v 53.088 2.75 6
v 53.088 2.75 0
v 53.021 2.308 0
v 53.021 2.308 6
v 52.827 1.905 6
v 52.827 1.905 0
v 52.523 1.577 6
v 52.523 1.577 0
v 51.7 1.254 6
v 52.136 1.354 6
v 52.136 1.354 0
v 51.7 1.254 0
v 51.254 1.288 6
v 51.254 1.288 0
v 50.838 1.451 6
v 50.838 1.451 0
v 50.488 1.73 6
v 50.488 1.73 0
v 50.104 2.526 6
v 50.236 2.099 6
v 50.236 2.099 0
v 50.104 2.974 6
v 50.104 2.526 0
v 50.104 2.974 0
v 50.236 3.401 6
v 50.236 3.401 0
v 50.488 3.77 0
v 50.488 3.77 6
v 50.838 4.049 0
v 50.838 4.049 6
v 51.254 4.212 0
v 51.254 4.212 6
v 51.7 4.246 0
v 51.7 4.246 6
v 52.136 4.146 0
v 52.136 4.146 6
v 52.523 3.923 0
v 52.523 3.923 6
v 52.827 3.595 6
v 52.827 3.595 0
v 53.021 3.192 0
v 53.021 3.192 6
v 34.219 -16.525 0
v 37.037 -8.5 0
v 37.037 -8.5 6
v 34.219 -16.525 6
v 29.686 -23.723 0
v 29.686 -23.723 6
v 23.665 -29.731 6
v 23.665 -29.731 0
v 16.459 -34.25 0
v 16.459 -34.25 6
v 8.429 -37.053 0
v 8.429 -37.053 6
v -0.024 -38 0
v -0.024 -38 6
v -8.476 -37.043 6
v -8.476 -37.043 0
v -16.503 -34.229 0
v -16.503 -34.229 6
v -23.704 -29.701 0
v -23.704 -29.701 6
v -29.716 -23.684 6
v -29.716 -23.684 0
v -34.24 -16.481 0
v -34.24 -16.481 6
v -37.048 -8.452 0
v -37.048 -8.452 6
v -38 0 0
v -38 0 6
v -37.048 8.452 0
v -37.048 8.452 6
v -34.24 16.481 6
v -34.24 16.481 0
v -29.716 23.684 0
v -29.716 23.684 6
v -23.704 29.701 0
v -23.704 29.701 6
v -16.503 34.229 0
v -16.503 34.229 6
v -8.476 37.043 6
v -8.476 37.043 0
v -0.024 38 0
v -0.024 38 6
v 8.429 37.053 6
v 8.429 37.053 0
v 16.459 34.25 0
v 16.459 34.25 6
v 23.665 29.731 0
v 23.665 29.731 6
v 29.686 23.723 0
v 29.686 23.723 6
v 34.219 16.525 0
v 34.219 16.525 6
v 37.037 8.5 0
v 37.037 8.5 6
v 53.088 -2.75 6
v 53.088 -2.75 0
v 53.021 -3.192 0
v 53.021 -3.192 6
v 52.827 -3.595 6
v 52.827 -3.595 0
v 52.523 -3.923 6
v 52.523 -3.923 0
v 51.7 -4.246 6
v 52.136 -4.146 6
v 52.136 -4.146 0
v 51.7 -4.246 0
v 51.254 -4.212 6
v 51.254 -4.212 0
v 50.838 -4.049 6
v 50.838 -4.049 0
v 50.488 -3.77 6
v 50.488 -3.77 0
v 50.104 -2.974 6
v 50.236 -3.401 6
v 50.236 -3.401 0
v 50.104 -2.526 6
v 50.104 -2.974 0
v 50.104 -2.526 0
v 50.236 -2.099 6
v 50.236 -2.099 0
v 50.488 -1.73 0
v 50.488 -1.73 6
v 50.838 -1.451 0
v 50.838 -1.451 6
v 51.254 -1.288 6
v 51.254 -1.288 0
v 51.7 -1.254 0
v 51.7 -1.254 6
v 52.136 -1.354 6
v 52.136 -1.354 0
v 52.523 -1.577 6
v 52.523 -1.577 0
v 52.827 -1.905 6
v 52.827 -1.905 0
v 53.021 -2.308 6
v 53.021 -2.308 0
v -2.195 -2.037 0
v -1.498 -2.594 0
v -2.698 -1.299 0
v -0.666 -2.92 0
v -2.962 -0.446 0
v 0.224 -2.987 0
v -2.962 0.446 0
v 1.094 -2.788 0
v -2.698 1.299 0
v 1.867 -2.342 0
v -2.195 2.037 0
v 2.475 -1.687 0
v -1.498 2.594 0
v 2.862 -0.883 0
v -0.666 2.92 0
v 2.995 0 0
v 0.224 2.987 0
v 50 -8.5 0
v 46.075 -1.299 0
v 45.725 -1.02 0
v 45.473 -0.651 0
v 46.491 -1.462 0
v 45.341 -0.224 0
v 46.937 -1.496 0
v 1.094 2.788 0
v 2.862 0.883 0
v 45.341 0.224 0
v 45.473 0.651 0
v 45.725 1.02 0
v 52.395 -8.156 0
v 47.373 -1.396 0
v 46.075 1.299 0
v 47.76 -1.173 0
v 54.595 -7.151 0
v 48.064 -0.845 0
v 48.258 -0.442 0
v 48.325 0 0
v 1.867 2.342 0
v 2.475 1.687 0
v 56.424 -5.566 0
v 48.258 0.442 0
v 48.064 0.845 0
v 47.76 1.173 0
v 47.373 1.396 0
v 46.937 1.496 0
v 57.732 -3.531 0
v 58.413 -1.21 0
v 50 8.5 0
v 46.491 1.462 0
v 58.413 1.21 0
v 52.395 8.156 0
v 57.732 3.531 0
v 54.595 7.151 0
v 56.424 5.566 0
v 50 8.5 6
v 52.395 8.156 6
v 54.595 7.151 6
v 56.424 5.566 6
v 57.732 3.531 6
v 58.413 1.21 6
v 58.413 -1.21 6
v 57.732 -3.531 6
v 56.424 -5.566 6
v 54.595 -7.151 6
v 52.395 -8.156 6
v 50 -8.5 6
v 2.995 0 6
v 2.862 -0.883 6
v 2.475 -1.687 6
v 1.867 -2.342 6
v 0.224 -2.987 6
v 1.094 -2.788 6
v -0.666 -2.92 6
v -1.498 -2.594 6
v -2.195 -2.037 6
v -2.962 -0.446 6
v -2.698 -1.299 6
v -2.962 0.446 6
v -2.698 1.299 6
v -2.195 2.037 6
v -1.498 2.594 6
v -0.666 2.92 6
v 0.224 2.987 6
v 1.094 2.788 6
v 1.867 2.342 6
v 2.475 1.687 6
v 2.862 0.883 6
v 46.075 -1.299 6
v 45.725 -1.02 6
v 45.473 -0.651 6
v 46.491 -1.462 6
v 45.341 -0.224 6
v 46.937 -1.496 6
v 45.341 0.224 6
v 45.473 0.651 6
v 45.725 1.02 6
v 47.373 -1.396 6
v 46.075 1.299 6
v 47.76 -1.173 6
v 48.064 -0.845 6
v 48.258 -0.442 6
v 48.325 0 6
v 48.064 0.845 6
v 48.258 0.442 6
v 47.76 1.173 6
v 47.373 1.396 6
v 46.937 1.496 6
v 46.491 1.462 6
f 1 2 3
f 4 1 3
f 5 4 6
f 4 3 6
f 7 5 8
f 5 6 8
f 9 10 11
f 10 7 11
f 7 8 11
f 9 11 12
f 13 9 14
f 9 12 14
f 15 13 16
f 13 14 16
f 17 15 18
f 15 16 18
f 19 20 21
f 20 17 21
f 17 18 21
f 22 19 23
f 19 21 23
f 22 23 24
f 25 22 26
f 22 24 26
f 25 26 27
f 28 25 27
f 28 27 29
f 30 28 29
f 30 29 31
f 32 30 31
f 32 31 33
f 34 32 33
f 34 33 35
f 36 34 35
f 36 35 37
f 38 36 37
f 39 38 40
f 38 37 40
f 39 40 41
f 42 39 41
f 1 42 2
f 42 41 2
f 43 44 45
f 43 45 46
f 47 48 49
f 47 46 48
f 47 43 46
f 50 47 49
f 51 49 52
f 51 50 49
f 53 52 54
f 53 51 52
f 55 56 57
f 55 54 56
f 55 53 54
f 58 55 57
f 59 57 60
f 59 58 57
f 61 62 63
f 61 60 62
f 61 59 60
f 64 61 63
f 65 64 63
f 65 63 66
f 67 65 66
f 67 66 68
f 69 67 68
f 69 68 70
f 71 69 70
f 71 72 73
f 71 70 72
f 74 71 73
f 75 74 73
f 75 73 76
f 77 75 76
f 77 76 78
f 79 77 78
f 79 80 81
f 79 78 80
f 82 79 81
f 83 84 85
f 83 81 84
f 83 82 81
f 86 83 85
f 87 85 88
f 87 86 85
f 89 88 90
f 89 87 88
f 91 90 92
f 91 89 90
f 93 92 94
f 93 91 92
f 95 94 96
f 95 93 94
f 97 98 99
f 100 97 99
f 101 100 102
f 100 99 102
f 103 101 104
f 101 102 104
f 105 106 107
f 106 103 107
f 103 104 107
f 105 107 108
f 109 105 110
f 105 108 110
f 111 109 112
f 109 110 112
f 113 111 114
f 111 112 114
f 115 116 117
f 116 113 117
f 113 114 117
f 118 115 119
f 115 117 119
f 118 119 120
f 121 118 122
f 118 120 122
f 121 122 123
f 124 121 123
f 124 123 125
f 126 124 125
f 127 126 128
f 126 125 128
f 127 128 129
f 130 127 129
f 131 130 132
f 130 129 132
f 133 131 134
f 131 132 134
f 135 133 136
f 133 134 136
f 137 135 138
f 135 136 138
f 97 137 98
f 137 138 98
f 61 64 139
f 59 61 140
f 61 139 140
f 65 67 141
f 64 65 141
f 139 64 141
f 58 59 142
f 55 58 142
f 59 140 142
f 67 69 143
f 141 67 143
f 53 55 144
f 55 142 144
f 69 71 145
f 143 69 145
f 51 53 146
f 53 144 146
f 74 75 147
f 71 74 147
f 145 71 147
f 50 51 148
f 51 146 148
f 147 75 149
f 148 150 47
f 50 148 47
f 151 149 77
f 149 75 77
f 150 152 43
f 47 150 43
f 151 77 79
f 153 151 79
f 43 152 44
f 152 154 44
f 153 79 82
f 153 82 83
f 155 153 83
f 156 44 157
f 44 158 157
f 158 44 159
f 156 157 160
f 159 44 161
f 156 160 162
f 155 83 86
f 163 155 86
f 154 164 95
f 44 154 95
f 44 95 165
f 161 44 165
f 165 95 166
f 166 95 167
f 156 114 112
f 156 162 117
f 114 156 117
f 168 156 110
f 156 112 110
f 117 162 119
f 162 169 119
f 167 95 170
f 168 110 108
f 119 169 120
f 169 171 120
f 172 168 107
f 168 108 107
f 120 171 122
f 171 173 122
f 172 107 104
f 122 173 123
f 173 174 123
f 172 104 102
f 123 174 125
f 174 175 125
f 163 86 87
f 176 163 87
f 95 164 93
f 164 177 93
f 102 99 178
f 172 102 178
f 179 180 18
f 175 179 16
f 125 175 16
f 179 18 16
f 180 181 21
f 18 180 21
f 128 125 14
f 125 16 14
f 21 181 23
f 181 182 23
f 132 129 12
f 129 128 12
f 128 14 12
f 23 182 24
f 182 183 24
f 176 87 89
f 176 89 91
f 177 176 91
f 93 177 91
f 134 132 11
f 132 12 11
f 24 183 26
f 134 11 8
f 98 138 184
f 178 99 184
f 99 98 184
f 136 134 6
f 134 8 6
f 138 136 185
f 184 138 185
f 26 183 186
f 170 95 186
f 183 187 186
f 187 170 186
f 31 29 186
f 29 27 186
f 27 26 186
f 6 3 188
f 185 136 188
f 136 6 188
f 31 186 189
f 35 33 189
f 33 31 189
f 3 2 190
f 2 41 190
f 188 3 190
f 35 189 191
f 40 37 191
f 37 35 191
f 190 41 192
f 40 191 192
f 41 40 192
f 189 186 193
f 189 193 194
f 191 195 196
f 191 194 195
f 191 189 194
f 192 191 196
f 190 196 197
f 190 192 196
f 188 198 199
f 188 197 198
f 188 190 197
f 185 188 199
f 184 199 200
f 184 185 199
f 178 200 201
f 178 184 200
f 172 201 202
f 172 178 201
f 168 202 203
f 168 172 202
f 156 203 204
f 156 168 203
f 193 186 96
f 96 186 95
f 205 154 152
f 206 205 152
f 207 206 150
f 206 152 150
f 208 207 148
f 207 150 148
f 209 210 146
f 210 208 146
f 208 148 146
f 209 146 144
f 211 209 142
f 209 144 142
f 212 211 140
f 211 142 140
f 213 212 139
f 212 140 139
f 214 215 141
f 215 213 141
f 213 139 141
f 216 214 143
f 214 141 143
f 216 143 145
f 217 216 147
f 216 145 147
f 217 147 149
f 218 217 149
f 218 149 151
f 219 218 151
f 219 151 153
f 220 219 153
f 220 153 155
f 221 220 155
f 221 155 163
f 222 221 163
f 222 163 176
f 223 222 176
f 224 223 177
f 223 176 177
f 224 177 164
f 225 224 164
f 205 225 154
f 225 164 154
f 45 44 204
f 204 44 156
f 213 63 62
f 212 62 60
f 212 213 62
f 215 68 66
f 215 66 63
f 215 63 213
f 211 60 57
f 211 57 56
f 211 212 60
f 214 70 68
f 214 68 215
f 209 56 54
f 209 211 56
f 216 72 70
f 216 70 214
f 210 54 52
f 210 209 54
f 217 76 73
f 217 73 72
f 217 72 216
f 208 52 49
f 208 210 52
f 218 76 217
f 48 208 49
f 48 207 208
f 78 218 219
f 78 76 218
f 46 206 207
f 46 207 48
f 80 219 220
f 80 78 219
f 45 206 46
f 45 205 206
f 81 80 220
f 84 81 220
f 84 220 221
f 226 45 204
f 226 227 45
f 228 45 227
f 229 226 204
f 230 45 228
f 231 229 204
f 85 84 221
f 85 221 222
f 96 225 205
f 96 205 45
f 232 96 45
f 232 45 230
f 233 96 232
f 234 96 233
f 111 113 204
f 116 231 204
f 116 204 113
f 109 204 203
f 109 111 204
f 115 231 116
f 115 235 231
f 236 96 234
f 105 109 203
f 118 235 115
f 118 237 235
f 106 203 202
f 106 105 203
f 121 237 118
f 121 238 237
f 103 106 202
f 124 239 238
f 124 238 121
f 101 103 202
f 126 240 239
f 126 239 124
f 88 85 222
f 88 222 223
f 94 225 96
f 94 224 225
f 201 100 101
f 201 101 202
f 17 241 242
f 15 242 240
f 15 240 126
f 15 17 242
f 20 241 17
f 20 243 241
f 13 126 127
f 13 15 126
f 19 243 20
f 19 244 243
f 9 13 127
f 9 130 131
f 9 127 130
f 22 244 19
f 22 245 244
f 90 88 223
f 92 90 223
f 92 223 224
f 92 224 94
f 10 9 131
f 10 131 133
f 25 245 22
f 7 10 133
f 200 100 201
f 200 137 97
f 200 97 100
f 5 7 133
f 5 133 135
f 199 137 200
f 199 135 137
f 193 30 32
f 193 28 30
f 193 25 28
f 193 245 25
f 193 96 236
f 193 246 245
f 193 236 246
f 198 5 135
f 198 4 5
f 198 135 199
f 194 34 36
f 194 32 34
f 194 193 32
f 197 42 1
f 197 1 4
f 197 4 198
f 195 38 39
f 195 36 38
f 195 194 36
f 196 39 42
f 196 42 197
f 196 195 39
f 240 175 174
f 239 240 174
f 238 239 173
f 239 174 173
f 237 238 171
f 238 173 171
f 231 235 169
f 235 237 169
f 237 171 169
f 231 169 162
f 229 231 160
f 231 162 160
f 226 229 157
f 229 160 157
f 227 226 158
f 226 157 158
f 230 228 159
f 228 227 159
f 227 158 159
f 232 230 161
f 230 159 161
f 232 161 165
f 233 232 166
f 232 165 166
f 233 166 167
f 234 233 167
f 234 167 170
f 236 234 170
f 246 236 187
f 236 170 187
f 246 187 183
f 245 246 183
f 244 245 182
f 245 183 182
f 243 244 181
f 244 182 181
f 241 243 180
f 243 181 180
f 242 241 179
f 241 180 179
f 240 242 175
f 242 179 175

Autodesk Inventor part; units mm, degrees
ref_plane "YZ Plane" through (0, 0, 0) normal (1, 0, 0) x (0, 1, 0)
ref_plane "XZ Plane" through (0, 0, 0) normal (0, 1, 0) x (-1, 0, 0)
ref_plane "XY Plane" through (0, 0, 0) normal (0, 0, 1) x (1, 0, 0)
sketch "スケッチ1" plane through (0, 0, 0) normal (0, 0, 1) x (1, 0, 0)
  circle A0 centre (0, 0) radius 38
  line L0 (0, 0) -> (50, 0) construction
  line L1 (0, -8.5) -> (50, -8.5)
  line L2 (50, 8.5) -> (0, 8.5)
  arc A1 (0, 8.5) -> (0, -8.5) centre (0, 0) ccw
  arc A2 (50, -8.5) -> (50, 8.5) centre (50, 0) ccw
  line L3 (46.8246, 0) -> (51.5877, 2.75) construction
  line L4 (51.5877, 2.75) -> (51.5877, -2.75) construction
  line L5 (51.5877, -2.75) -> (46.8246, 0) construction
  circle A3 centre (51.5877, 2.75) radius 1.5
  circle A4 centre (46.8246, 0) radius 1.5
  circle A5 centre (51.5877, -2.75) radius 1.5
  circle A6 centre (0, 0) radius 2.995
  point P0 (25, 0)
  dimension "d0" = 76
  dimension "d2" = 50
  dimension "d3" = 17
  dimension "d4" = 3
  dimension "d5" = 3
  dimension "d6" = 3
  dimension "d7" = 5.5
  dimension "d8" = 5.99
extrude "押し出し1" add sketch "スケッチ1" along normal blind 6
properties part number "アーム最終段円盤" material "アルミニウム 7075"
